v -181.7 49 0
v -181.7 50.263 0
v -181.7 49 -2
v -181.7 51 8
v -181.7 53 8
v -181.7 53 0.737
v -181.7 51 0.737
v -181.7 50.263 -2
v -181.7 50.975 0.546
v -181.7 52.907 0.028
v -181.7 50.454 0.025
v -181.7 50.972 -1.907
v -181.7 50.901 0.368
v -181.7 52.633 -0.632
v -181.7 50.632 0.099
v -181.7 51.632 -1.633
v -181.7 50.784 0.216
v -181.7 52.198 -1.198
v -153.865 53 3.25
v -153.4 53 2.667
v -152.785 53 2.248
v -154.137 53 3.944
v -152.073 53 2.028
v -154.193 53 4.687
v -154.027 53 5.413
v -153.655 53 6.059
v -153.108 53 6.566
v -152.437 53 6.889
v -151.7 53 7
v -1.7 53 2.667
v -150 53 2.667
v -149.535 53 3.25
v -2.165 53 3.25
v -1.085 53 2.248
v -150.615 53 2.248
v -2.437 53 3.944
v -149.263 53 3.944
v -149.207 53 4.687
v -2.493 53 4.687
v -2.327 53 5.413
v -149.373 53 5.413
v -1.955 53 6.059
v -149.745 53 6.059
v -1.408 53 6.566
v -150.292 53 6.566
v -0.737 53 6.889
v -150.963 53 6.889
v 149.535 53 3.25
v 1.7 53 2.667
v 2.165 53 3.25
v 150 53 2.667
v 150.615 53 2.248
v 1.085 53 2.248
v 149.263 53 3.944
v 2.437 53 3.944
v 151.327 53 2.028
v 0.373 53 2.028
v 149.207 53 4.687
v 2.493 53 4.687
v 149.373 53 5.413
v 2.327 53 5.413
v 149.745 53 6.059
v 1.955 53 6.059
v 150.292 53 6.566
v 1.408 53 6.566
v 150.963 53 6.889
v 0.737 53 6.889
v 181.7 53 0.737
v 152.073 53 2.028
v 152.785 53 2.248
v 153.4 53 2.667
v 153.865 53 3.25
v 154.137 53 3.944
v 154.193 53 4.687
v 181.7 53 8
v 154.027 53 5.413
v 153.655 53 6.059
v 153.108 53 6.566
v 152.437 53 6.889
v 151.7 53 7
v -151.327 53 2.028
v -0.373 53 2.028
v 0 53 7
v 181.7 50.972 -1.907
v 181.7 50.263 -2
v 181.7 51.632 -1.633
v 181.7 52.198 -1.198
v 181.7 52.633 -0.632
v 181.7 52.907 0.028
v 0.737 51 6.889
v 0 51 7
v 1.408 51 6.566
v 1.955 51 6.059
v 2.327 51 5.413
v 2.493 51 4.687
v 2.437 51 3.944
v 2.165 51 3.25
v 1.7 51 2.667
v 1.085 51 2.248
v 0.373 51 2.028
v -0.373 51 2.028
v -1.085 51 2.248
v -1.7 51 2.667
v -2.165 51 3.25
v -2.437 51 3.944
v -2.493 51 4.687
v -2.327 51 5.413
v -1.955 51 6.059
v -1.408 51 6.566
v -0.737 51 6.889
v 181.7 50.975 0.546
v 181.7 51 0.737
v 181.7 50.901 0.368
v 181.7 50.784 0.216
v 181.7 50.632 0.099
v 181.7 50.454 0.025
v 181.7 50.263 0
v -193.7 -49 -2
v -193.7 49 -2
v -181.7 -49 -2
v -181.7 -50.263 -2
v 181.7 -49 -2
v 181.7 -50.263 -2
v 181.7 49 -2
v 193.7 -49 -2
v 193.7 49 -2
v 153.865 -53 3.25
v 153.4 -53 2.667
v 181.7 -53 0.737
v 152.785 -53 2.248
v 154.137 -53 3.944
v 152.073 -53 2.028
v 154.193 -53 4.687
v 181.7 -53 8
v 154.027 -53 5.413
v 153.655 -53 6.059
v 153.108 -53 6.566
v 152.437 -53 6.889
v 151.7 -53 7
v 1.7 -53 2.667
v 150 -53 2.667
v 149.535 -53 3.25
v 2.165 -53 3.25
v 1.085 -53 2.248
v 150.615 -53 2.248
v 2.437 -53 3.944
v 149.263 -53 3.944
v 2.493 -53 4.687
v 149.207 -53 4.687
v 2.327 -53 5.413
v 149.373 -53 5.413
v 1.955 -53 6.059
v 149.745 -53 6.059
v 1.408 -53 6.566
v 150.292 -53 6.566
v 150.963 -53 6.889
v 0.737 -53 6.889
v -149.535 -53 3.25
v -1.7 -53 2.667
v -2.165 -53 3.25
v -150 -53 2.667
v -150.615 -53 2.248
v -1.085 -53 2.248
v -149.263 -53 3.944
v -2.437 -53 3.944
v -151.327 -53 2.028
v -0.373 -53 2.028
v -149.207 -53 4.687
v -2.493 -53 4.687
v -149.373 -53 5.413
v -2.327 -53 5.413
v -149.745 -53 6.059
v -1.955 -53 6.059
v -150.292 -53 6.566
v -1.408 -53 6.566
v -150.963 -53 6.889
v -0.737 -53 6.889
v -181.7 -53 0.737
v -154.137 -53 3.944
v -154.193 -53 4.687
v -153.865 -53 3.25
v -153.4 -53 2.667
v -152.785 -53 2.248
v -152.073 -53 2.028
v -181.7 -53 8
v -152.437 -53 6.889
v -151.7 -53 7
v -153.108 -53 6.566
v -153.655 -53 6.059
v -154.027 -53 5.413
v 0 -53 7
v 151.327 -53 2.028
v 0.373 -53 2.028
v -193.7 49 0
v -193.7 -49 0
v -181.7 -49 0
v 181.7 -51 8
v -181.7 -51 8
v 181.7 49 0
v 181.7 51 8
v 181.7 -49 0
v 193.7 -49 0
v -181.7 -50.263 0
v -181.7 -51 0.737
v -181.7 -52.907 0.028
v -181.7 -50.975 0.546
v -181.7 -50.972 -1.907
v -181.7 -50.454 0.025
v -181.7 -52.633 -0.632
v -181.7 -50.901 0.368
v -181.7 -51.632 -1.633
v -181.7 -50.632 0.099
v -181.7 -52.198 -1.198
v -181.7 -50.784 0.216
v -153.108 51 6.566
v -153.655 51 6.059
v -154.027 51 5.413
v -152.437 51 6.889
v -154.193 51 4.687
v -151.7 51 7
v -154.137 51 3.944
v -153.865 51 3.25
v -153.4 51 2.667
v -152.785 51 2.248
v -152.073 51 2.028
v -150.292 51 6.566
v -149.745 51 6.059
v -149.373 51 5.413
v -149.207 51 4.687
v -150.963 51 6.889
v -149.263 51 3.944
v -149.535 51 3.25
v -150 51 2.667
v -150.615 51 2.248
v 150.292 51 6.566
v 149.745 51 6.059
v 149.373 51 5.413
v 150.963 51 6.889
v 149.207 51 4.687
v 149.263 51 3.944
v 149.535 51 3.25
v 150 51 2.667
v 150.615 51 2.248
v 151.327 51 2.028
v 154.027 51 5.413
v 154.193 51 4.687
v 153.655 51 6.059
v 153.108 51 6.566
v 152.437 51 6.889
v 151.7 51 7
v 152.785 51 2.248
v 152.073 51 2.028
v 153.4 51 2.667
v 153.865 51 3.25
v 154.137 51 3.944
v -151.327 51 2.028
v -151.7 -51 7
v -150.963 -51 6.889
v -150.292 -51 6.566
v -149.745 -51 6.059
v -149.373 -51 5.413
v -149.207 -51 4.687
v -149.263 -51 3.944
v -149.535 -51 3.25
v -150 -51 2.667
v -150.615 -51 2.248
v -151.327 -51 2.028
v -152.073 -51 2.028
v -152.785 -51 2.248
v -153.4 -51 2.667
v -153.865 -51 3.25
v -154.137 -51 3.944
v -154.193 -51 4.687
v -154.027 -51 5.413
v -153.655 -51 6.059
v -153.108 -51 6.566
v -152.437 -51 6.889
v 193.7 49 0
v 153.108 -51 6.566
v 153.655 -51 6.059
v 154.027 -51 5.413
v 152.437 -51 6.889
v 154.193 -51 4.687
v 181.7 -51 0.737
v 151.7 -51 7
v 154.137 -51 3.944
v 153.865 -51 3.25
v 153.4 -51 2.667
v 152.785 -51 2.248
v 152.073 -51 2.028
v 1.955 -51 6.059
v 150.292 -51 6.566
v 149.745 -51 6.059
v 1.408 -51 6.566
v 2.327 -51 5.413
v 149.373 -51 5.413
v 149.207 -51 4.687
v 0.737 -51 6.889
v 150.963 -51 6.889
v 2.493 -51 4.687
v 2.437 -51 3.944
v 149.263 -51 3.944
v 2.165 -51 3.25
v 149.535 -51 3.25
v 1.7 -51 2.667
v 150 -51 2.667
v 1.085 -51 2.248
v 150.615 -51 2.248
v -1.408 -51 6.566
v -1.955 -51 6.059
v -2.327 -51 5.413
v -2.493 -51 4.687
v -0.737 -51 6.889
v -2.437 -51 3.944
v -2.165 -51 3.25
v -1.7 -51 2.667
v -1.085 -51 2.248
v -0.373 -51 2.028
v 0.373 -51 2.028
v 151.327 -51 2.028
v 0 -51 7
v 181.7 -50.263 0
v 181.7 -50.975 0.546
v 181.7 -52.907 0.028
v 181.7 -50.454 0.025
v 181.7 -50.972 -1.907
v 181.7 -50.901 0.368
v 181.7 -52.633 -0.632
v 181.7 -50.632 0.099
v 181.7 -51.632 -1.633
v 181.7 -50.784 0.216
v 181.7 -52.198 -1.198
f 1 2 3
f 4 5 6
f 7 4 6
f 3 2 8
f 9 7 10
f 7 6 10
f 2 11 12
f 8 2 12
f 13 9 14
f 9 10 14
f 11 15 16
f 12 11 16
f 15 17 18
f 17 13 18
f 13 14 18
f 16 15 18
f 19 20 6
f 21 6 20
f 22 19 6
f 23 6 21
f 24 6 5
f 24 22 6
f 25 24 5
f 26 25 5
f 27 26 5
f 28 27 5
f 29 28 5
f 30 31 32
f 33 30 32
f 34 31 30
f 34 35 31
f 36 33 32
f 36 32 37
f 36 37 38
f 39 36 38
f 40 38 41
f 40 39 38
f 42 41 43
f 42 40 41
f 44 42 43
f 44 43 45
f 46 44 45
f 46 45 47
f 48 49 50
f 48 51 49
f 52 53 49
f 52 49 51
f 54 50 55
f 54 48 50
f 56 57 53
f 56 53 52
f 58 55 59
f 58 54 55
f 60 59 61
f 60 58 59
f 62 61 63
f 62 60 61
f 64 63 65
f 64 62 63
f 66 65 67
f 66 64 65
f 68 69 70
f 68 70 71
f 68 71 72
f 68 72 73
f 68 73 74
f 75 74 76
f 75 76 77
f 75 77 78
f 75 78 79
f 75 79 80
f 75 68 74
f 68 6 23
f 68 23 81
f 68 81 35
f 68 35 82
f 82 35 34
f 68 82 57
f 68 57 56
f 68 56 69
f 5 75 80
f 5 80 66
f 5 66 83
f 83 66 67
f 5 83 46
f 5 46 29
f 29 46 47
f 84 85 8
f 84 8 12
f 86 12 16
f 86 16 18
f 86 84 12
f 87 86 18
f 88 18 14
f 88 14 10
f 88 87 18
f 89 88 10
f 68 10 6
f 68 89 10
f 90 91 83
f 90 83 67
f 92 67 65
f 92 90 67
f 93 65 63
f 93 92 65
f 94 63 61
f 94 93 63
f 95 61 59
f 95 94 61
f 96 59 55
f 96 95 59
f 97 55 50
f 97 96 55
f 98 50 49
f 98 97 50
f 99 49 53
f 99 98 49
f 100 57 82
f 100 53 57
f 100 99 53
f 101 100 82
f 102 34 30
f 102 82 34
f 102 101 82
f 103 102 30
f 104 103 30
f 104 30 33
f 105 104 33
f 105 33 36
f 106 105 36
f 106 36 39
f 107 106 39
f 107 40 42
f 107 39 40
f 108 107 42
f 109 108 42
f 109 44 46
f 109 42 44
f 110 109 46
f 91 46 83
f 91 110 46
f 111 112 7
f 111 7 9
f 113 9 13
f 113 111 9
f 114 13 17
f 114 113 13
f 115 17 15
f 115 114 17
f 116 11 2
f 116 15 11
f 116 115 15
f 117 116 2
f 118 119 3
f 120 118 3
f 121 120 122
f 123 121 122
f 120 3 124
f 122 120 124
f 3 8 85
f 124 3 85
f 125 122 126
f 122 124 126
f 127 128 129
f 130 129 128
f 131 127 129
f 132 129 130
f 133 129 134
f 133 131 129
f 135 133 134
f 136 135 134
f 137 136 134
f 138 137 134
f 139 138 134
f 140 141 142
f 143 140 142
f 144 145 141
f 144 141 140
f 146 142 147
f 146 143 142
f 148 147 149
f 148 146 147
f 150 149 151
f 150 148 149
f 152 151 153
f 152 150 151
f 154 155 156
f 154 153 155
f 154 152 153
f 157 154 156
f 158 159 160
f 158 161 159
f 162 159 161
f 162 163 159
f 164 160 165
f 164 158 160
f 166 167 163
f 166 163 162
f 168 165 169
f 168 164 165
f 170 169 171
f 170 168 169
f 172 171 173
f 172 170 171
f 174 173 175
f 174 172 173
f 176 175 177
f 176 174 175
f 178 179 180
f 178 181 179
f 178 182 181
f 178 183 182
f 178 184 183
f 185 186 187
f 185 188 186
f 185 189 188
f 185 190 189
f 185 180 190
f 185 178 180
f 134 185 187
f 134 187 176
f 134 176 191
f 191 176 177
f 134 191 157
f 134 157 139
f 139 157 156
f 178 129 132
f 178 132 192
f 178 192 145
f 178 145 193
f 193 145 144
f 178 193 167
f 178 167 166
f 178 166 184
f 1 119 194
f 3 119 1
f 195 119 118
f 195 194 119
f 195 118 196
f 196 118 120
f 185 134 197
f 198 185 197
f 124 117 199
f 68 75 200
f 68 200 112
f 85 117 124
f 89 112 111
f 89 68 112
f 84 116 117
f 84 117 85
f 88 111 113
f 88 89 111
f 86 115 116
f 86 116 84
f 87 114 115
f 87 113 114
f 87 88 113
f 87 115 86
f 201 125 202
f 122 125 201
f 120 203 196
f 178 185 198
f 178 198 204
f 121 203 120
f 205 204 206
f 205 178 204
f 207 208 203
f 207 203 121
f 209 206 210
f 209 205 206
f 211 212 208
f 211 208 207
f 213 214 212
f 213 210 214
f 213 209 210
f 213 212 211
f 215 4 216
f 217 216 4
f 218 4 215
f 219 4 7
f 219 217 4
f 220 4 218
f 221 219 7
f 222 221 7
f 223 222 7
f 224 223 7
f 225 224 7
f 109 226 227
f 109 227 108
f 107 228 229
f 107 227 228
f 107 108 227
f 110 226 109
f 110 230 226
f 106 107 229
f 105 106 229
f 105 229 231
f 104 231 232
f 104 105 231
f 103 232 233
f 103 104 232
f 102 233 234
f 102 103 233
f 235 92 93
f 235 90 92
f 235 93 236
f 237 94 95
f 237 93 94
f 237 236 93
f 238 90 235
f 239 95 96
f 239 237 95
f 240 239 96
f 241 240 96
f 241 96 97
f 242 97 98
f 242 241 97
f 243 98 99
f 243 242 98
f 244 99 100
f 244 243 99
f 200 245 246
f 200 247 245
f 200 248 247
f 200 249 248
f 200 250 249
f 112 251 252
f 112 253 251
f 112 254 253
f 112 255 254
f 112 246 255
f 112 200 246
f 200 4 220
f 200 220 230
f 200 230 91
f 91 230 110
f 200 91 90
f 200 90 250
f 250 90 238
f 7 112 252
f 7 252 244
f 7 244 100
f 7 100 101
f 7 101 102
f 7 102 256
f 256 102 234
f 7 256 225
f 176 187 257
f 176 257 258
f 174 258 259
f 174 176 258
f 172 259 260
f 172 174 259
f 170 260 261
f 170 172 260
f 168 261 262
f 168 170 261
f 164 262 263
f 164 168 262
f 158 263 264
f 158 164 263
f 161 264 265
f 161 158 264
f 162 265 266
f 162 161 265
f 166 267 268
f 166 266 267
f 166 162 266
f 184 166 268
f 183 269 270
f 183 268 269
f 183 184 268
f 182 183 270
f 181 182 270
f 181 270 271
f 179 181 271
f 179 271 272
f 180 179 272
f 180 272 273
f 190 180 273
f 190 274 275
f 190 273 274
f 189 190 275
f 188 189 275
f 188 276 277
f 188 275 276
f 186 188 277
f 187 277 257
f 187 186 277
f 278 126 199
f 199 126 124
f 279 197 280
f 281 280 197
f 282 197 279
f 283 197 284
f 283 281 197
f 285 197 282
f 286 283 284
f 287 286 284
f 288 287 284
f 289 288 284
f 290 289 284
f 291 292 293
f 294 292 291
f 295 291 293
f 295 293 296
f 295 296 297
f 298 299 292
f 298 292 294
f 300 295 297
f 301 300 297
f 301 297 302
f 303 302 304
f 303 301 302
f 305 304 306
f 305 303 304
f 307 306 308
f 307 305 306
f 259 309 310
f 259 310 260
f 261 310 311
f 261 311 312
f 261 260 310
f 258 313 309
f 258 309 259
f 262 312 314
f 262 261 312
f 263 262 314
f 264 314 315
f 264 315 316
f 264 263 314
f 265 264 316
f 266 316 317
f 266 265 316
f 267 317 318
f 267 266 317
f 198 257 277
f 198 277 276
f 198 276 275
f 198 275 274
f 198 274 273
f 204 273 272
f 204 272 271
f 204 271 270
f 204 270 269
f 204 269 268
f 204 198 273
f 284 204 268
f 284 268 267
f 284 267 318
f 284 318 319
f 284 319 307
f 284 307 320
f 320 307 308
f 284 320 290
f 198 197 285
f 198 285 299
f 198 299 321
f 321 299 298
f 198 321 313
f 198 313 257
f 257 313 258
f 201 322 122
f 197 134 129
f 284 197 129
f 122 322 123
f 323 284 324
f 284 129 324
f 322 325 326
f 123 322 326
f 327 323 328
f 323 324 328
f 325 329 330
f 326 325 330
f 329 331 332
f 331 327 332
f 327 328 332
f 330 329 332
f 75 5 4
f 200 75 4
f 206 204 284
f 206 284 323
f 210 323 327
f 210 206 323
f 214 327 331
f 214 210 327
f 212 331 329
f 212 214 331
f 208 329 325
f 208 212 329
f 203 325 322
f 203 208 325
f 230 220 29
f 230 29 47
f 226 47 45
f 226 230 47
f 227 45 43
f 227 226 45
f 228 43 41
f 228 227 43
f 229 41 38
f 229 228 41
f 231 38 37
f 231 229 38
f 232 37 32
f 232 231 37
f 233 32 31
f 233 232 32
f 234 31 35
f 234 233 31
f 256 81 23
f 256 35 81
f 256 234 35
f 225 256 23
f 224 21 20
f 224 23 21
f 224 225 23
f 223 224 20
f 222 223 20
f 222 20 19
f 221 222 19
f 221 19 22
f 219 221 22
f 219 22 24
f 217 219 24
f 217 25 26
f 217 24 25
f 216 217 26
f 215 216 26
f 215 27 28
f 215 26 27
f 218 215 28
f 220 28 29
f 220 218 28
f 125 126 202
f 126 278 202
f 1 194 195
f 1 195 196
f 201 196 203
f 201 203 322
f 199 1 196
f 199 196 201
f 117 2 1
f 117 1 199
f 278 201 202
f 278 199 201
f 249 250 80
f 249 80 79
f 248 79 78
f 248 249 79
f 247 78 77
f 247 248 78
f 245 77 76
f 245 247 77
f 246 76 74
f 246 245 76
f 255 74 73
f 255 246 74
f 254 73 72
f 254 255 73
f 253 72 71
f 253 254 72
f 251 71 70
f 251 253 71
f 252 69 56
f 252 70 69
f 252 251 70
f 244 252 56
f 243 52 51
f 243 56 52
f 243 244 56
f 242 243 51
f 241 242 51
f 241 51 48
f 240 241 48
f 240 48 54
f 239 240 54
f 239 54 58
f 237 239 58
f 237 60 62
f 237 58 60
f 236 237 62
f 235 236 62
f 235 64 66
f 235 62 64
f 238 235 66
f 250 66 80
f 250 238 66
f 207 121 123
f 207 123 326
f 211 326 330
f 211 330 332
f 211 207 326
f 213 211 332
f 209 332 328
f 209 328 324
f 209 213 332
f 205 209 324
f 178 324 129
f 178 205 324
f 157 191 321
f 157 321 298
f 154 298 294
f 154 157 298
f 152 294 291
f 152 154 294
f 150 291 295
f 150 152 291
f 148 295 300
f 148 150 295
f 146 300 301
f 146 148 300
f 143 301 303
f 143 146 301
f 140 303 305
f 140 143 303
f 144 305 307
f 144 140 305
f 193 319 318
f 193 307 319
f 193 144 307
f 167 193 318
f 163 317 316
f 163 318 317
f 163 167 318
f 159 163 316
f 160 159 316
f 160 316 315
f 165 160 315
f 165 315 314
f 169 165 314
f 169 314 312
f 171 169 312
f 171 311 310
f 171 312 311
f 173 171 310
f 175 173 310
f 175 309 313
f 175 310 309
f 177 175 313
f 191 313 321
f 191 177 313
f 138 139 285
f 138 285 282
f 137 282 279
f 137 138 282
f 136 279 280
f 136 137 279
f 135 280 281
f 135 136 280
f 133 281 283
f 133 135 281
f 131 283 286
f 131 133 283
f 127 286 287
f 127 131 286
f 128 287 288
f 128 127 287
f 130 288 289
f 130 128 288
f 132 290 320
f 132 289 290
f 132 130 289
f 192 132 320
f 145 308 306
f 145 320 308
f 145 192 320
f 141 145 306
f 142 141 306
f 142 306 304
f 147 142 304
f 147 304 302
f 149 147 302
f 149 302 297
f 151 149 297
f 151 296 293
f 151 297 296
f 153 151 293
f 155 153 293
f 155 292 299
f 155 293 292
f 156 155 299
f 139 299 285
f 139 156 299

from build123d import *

# Parameters (mm, degrees)
SKETCH1_W                    = 387.4
SKETCH1_H                    = 106
BASE_FLANGE1_DEPTH           = 2
EDGE_FLANGE1_STRIP_W         = 9.4732
EDGE_FLANGE1_STRIP_H         = 2
EDGE_FLANGE1_STRIP_CUT_DEPTH = 387.4
EDGE_FLANGE1_DEPTH           = 387.4
EDGE_FLANGE2_STRIP_W         = 9.4732
EDGE_FLANGE2_STRIP_H         = 2
EDGE_FLANGE2_STRIP_CUT_DEPTH = 387.4
EDGE_FLANGE2_DEPTH           = 387.4
SKETCH14_W                   = 73.905952632
SKETCH14_H                   = 44.03163087
CUT_EXTRUDE1_DEPTH           = 4
MIRROR2_COPY_1_SKETCH_W      = 73.905952632
MIRROR2_COPY_1_SKETCH_H      = 44.03163087
MIRROR2_COPY_1_DEPTH         = 4
CUT_EXTRUDE2_DEPTH           = 221.95178207
CUT_EXTRUDE2_DEPTH_BACK      = 221.95178207
SKETCH15_R                   = 2.5


# Sheet-metal steps are written as plain solids
with BuildPart() as part:
    # Sketch1 → Base-Flange1 (new body)
    with BuildSketch(Plane.XY):
        Rectangle(SKETCH1_W, SKETCH1_H)
    extrude(amount=-BASE_FLANGE1_DEPTH)

    # Edge-Flange1 strip (across the edge) → Edge-Flange1 strip cut (cut)
    with BuildSketch(Plane(origin=(193.7, 53, 0), x_dir=(0, -1, 0), z_dir=(-1, 0, 0))):
        with Locations((-2, -1)):
            Rectangle(EDGE_FLANGE1_STRIP_W, EDGE_FLANGE1_STRIP_H)
    extrude(amount=EDGE_FLANGE1_STRIP_CUT_DEPTH, mode=Mode.SUBTRACT)

    # Edge-Flange1 section (across the edge) → Edge-Flange1 (add)
    with BuildSketch(Plane(origin=(193.7, 53, 0), x_dir=(0, -1, 0), z_dir=(-1, 0, 0))):
        with BuildLine():
            Line((0, 0.7366), (0, 8))
            Line((0, 8), (2, 8))
            Line((2, 8), (2, 0.7366))
            ThreePointArc((2, 0.7366), (2.215745145, 0.215745145), (2.7366, 0))
            Line((2.7366, 0), (2.7366, -2))
            ThreePointArc((2.7366, -2), (0.801531583, -1.198468417), (0, 0.7366))
        make_face()
    extrude(amount=EDGE_FLANGE1_DEPTH)

    # Edge-Flange2 strip (across the edge) → Edge-Flange2 strip cut (cut)
    with BuildSketch(Plane(origin=(-193.7, -53, 0), x_dir=(0, 1, 0), z_dir=(1, 0, 0))):
        with Locations((-2, -1)):
            Rectangle(EDGE_FLANGE2_STRIP_W, EDGE_FLANGE2_STRIP_H)
    extrude(amount=EDGE_FLANGE2_STRIP_CUT_DEPTH, mode=Mode.SUBTRACT)

    # Edge-Flange2 section (across the edge) → Edge-Flange2 (add)
    with BuildSketch(Plane(origin=(-193.7, -53, 0), x_dir=(0, 1, 0), z_dir=(1, 0, 0))):
        with BuildLine():
            Line((0, 0.7366), (0, 8))
            Line((0, 8), (2, 8))
            Line((2, 8), (2, 0.7366))
            ThreePointArc((2, 0.7366), (2.215745145, 0.215745145), (2.7366, 0))
            Line((2.7366, 0), (2.7366, -2))
            ThreePointArc((2.7366, -2), (0.801531583, -1.198468417), (0, 0.7366))
        make_face()
    extrude(amount=EDGE_FLANGE2_DEPTH)

    # Sketch14 → Cut-Extrude1 (cut)
    with BuildSketch(Plane(origin=(0, 53, 0), x_dir=(1, 0, 0), z_dir=(0, 1, 0))):
        with Locations((-218.652976316, 2.389975087)):
            Rectangle(SKETCH14_W, SKETCH14_H)
    cut_extrude1 = extrude(amount=-CUT_EXTRUDE1_DEPTH, mode=Mode.SUBTRACT)

    # Mirror1: Cut-Extrude1 across plane
    add(cut_extrude1.mirror(Plane.ZX), mode=Mode.SUBTRACT)

    # Mirror2: Cut-Extrude1 across plane
    add(cut_extrude1.mirror(Plane(origin=(0, 0, 0), x_dir=(0, 0, 1), z_dir=(1, 0, 0))), mode=Mode.SUBTRACT)

    # Mirror2 copy 1 sketch → Mirror2 copy 1 (cut)
    with BuildSketch(Plane(origin=(0, -53, 0), x_dir=(-1, 0, 0), z_dir=(0, -1, 0))):
        with Locations((-218.652976316, 2.389975087)):
            Rectangle(MIRROR2_COPY_1_SKETCH_W, MIRROR2_COPY_1_SKETCH_H)
    extrude(amount=-MIRROR2_COPY_1_DEPTH, mode=Mode.SUBTRACT)

    # Sketch15 → Cut-Extrude2 (cut, two sides: drawn at the far end of the back side and taken through both)
    with BuildSketch(Plane(origin=(0, 53, 0), x_dir=(1, 0, 0), z_dir=(0, 1, 0)).offset(-CUT_EXTRUDE2_DEPTH_BACK)):
        with Locations(Location((151.7, -4.5, 0), (0, 0, 270))):
            Circle(SKETCH15_R)
        with Locations(Location((0, -4.5, 0), (0, 0, 270))):
            Circle(SKETCH15_R)
        with Locations(Location((-151.7, -4.5, 0), (0, 0, 270))):
            Circle(SKETCH15_R)
    extrude(amount=CUT_EXTRUDE2_DEPTH + CUT_EXTRUDE2_DEPTH_BACK, mode=Mode.SUBTRACT)


solid = part.part
